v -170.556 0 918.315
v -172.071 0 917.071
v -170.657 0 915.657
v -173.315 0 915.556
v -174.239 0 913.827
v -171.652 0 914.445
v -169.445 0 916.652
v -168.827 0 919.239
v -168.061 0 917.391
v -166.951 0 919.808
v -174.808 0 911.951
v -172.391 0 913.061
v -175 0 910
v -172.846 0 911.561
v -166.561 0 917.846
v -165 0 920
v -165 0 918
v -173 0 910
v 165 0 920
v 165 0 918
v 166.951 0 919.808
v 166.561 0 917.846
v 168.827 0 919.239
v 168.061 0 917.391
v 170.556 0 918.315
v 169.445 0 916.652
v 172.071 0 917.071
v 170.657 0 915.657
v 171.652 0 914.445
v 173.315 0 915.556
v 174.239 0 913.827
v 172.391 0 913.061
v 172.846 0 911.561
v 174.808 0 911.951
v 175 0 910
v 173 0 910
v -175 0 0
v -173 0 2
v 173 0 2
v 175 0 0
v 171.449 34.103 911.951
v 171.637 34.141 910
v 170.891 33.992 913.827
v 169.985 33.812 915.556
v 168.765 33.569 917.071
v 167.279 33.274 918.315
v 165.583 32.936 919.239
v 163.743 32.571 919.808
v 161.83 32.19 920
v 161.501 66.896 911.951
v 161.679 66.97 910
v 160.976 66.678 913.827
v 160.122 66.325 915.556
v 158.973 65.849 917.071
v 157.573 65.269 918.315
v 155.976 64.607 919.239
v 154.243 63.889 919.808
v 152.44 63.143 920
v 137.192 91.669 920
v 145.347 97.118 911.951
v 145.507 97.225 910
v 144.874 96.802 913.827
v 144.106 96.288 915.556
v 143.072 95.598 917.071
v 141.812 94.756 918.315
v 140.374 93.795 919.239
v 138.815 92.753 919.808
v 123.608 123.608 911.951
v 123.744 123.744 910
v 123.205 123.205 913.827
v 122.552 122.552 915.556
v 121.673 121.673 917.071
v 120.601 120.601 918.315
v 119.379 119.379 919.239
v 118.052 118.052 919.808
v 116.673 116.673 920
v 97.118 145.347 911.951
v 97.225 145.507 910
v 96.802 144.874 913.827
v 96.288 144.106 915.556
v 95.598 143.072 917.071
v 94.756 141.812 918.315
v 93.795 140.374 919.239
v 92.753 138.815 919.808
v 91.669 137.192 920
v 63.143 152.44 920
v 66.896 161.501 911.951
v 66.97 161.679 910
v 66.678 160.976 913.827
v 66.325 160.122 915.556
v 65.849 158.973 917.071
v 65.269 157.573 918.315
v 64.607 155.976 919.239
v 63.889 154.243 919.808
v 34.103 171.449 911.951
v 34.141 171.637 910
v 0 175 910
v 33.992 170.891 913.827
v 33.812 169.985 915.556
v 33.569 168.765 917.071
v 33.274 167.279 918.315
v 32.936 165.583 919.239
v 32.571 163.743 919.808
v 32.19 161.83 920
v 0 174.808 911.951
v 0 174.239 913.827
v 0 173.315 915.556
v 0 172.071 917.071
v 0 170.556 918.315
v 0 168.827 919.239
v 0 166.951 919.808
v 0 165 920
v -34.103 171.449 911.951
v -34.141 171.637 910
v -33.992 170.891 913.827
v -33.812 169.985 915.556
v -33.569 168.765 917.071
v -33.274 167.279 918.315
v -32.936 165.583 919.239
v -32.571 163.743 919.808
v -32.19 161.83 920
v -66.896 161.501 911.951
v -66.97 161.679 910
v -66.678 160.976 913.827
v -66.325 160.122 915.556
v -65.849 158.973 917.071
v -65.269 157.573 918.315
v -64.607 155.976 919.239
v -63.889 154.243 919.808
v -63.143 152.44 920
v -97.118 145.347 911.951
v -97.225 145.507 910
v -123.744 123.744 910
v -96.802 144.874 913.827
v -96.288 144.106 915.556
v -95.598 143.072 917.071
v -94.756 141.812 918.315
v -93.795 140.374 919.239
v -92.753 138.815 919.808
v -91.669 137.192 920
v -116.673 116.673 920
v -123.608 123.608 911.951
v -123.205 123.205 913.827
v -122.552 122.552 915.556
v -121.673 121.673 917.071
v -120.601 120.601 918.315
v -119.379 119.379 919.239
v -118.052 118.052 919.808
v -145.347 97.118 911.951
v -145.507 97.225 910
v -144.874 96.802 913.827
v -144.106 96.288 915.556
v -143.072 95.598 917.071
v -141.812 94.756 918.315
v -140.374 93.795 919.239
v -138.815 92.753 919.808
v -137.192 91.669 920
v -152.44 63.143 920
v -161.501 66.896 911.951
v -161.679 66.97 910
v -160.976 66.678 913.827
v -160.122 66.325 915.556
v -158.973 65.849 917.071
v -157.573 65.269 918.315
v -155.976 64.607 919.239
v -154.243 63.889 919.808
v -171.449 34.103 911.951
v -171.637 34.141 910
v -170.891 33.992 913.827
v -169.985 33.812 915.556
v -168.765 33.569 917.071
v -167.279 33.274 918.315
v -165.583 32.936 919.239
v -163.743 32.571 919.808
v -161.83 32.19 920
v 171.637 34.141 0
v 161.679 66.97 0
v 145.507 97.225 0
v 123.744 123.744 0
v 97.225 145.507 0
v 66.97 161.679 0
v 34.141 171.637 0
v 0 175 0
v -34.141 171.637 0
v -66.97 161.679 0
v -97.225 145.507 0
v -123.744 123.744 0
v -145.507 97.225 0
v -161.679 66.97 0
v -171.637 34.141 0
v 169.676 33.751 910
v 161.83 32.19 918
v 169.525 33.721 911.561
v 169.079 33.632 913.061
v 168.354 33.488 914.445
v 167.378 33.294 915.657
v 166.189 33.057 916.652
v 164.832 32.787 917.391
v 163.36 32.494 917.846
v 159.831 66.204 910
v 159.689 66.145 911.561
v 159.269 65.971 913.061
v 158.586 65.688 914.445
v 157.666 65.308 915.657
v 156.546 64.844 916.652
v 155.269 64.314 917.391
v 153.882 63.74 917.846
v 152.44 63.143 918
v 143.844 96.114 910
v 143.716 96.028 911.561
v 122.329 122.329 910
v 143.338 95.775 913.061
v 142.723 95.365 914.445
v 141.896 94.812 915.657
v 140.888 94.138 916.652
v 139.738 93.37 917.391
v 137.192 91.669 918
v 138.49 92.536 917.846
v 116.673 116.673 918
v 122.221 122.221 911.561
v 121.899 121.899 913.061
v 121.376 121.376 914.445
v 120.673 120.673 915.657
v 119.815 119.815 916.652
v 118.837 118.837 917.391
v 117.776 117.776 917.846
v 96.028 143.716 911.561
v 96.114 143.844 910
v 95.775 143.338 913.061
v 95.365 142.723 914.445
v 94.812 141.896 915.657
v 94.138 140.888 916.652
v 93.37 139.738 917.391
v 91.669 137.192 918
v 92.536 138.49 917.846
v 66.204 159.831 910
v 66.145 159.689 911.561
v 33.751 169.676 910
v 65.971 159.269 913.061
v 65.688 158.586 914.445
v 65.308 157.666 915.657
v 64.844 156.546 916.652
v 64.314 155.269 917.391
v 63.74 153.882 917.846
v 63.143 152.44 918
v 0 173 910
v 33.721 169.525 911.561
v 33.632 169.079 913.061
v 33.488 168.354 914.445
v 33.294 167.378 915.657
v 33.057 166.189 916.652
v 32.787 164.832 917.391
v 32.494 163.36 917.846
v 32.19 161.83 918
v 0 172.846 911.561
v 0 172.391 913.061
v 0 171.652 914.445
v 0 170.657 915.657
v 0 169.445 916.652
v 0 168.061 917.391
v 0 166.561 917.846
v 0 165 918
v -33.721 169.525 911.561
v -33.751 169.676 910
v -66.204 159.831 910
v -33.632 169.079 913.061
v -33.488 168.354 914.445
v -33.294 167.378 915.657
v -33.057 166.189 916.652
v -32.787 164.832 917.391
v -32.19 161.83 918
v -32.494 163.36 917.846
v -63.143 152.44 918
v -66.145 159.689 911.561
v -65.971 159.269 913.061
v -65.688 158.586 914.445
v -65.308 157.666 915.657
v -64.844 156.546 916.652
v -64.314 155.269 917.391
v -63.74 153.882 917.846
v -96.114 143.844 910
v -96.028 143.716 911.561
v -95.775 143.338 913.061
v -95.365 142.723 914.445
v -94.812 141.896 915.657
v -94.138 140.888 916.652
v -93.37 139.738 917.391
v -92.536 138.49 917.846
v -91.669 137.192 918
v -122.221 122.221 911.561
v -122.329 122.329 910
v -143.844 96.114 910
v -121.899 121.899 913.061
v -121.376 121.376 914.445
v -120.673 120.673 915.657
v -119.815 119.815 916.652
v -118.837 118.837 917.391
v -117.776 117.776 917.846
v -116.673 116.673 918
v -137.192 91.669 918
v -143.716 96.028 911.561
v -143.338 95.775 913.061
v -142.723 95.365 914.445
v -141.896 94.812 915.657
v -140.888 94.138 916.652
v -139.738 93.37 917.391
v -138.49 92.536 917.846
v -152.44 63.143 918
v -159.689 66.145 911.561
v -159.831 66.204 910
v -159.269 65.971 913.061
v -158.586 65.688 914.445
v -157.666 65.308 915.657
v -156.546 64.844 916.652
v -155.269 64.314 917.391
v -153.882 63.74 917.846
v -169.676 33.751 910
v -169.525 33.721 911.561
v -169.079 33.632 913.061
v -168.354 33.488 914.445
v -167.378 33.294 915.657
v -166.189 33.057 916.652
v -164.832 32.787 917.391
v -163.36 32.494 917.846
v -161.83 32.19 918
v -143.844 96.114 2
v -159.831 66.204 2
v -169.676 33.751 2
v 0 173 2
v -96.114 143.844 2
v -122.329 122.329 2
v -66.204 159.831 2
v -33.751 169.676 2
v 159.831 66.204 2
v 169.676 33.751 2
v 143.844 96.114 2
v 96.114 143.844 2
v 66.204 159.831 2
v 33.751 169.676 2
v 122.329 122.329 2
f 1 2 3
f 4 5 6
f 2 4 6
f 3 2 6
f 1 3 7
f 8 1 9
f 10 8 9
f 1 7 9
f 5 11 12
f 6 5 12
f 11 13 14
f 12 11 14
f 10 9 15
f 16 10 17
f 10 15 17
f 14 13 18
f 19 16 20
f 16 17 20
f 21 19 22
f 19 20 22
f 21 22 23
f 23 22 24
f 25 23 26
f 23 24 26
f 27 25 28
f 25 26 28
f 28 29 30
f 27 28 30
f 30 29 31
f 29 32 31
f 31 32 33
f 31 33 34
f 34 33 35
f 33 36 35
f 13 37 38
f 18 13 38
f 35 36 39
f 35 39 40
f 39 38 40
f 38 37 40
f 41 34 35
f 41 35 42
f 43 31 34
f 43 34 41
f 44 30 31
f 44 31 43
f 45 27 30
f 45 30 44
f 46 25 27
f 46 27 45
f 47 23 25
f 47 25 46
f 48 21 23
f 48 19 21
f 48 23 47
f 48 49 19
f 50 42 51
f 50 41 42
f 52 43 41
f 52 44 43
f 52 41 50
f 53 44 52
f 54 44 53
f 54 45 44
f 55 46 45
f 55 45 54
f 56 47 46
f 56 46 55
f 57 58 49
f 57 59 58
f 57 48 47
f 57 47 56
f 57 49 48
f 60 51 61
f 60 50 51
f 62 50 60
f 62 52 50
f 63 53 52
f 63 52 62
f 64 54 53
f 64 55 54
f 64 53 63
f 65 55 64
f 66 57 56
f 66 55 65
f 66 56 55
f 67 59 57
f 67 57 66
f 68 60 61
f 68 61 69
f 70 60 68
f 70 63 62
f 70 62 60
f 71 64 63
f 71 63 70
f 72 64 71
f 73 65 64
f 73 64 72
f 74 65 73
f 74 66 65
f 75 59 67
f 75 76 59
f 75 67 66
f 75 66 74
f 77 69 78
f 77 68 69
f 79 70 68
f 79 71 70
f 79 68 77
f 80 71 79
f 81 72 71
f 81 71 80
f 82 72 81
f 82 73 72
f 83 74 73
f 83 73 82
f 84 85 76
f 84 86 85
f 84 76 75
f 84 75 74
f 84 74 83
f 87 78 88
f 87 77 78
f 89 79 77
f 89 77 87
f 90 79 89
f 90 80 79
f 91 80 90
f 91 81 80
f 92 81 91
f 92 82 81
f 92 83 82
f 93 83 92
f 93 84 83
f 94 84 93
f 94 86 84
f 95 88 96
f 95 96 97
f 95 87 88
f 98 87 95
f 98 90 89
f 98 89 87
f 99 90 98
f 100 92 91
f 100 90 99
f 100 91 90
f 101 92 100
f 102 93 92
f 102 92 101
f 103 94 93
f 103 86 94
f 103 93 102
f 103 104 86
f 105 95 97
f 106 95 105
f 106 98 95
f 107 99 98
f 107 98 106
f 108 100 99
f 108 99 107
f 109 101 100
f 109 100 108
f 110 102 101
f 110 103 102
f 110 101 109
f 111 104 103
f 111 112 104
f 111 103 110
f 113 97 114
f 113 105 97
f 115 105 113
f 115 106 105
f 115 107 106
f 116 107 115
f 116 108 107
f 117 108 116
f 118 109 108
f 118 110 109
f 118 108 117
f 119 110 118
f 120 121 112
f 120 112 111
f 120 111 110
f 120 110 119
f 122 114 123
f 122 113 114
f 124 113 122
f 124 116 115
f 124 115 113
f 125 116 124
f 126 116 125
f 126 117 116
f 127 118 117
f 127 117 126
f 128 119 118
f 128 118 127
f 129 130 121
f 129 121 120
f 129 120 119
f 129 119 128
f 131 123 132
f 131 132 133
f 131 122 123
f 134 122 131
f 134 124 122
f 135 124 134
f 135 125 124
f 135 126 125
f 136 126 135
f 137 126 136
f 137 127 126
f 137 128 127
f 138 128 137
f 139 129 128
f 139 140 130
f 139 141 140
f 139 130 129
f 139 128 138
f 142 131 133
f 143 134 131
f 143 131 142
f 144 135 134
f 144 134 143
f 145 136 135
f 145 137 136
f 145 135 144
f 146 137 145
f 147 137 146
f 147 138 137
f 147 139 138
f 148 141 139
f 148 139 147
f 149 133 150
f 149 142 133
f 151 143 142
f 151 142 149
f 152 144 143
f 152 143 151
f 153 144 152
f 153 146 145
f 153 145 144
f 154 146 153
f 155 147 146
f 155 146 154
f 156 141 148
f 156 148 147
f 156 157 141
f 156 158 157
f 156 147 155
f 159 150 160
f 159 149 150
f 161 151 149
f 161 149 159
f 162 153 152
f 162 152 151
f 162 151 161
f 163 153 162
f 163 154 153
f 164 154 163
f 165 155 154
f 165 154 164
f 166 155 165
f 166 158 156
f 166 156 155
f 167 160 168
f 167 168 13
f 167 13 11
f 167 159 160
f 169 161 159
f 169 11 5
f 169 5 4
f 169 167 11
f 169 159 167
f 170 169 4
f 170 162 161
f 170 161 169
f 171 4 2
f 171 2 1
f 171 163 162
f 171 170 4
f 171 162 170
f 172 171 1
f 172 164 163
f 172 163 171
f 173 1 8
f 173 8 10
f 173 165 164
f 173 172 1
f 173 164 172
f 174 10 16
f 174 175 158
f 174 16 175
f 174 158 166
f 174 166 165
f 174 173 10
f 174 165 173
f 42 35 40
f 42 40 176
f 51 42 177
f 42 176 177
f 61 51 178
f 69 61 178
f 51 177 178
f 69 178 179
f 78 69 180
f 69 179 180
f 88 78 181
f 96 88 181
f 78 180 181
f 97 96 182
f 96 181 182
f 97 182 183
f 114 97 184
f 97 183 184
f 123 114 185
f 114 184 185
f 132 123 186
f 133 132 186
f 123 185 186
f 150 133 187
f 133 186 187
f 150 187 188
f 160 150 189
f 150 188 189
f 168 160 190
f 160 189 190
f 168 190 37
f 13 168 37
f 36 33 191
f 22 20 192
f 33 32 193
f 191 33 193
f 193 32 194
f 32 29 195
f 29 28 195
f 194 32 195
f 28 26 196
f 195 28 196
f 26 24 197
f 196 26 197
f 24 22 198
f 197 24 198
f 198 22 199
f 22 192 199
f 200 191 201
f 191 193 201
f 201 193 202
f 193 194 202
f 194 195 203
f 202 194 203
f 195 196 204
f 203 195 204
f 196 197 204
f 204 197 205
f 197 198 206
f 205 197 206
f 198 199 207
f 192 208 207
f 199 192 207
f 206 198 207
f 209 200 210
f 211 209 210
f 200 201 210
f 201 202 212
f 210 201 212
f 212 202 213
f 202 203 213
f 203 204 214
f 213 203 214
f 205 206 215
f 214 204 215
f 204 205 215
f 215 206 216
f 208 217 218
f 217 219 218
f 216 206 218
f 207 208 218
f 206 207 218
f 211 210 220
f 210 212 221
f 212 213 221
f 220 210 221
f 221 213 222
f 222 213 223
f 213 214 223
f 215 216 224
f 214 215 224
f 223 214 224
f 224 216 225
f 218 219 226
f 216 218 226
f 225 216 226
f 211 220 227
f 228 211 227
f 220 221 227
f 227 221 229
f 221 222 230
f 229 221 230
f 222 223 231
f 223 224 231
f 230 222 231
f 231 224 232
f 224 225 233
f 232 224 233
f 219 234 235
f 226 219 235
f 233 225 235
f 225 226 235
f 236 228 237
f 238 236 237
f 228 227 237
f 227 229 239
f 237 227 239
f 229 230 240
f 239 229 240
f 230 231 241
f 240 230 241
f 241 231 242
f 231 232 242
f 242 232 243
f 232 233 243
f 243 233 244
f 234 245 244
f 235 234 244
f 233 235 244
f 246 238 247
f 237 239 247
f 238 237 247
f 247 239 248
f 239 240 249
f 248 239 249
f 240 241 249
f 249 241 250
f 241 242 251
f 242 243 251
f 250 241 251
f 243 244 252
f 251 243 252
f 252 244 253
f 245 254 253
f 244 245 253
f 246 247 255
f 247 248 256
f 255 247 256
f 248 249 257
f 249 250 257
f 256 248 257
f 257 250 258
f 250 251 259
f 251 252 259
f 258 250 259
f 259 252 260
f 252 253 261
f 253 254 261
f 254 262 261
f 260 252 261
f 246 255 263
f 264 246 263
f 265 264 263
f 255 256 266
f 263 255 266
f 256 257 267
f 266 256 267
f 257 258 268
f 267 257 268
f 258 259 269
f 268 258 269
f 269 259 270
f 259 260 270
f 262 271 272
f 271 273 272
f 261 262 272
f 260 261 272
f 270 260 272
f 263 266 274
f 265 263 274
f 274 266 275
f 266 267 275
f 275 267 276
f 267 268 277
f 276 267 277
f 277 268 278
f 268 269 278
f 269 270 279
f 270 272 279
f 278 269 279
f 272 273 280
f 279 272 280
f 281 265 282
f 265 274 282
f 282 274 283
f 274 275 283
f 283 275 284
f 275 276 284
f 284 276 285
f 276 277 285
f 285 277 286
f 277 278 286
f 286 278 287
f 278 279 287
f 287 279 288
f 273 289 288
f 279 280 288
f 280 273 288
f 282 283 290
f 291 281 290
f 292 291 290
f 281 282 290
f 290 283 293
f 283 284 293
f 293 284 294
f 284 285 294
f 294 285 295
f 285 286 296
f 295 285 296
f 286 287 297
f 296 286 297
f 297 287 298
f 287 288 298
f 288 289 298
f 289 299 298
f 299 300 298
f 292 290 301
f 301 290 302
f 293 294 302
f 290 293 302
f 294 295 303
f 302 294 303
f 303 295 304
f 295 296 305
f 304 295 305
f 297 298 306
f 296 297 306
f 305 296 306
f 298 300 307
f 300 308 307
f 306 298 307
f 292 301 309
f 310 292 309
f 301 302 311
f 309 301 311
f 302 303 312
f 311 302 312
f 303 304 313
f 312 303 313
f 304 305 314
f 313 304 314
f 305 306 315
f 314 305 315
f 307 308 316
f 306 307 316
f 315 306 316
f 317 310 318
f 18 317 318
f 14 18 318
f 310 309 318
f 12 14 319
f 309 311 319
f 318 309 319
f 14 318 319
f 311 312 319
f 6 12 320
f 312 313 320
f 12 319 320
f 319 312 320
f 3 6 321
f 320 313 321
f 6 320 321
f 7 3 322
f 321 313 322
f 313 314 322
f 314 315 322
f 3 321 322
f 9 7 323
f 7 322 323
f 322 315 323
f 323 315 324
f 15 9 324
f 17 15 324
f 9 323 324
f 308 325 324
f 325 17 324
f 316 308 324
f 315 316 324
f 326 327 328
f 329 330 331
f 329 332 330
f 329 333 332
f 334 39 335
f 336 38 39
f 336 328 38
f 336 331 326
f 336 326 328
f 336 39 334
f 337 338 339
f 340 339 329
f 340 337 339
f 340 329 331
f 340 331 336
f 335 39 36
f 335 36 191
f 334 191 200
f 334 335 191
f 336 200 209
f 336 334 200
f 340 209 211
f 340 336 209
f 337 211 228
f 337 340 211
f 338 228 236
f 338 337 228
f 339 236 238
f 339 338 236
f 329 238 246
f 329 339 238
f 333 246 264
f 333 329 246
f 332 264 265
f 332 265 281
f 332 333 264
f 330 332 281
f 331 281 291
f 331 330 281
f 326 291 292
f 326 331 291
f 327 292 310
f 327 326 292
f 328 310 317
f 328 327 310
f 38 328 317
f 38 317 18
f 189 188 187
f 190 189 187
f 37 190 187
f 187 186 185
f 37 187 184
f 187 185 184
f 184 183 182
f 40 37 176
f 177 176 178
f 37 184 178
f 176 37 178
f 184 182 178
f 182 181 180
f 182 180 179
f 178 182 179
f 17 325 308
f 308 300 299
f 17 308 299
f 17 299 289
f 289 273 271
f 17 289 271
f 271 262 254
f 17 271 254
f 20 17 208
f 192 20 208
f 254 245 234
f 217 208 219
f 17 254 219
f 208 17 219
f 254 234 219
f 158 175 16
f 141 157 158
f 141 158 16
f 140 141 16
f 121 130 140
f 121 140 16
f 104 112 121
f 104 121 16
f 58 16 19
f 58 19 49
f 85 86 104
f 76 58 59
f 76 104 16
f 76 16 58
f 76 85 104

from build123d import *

# Parameters (mm, degrees)
EXTRUDE_1_DEPTH = 920
FILLET_1_R      = 10
SHELL_1_T       = -2


with BuildPart() as part:
    # 草图1 → 凸台-拉伸1 (new body)
    with BuildSketch(Plane.XY):
        with BuildLine():
            Line((-175, 0), (175, 0))
            ThreePointArc((175, 0), (0, 175), (-175, 0))
        make_face()
    extrude(amount=EXTRUDE_1_DEPTH)

    # 圆角1
    fillet_1_edges = [part.edges().sort_by_distance(p)[0] for p in [
        (0, 175, 920),
    ]]
    fillet(fillet_1_edges, radius=FILLET_1_R)

    # 抽壳1
    shell_1_openings = [part.faces().sort_by_distance(p)[0] for p in [
        (0, 0, 459.938974789),
    ]]
    offset(amount=SHELL_1_T, openings=shell_1_openings)


solid = part.part
